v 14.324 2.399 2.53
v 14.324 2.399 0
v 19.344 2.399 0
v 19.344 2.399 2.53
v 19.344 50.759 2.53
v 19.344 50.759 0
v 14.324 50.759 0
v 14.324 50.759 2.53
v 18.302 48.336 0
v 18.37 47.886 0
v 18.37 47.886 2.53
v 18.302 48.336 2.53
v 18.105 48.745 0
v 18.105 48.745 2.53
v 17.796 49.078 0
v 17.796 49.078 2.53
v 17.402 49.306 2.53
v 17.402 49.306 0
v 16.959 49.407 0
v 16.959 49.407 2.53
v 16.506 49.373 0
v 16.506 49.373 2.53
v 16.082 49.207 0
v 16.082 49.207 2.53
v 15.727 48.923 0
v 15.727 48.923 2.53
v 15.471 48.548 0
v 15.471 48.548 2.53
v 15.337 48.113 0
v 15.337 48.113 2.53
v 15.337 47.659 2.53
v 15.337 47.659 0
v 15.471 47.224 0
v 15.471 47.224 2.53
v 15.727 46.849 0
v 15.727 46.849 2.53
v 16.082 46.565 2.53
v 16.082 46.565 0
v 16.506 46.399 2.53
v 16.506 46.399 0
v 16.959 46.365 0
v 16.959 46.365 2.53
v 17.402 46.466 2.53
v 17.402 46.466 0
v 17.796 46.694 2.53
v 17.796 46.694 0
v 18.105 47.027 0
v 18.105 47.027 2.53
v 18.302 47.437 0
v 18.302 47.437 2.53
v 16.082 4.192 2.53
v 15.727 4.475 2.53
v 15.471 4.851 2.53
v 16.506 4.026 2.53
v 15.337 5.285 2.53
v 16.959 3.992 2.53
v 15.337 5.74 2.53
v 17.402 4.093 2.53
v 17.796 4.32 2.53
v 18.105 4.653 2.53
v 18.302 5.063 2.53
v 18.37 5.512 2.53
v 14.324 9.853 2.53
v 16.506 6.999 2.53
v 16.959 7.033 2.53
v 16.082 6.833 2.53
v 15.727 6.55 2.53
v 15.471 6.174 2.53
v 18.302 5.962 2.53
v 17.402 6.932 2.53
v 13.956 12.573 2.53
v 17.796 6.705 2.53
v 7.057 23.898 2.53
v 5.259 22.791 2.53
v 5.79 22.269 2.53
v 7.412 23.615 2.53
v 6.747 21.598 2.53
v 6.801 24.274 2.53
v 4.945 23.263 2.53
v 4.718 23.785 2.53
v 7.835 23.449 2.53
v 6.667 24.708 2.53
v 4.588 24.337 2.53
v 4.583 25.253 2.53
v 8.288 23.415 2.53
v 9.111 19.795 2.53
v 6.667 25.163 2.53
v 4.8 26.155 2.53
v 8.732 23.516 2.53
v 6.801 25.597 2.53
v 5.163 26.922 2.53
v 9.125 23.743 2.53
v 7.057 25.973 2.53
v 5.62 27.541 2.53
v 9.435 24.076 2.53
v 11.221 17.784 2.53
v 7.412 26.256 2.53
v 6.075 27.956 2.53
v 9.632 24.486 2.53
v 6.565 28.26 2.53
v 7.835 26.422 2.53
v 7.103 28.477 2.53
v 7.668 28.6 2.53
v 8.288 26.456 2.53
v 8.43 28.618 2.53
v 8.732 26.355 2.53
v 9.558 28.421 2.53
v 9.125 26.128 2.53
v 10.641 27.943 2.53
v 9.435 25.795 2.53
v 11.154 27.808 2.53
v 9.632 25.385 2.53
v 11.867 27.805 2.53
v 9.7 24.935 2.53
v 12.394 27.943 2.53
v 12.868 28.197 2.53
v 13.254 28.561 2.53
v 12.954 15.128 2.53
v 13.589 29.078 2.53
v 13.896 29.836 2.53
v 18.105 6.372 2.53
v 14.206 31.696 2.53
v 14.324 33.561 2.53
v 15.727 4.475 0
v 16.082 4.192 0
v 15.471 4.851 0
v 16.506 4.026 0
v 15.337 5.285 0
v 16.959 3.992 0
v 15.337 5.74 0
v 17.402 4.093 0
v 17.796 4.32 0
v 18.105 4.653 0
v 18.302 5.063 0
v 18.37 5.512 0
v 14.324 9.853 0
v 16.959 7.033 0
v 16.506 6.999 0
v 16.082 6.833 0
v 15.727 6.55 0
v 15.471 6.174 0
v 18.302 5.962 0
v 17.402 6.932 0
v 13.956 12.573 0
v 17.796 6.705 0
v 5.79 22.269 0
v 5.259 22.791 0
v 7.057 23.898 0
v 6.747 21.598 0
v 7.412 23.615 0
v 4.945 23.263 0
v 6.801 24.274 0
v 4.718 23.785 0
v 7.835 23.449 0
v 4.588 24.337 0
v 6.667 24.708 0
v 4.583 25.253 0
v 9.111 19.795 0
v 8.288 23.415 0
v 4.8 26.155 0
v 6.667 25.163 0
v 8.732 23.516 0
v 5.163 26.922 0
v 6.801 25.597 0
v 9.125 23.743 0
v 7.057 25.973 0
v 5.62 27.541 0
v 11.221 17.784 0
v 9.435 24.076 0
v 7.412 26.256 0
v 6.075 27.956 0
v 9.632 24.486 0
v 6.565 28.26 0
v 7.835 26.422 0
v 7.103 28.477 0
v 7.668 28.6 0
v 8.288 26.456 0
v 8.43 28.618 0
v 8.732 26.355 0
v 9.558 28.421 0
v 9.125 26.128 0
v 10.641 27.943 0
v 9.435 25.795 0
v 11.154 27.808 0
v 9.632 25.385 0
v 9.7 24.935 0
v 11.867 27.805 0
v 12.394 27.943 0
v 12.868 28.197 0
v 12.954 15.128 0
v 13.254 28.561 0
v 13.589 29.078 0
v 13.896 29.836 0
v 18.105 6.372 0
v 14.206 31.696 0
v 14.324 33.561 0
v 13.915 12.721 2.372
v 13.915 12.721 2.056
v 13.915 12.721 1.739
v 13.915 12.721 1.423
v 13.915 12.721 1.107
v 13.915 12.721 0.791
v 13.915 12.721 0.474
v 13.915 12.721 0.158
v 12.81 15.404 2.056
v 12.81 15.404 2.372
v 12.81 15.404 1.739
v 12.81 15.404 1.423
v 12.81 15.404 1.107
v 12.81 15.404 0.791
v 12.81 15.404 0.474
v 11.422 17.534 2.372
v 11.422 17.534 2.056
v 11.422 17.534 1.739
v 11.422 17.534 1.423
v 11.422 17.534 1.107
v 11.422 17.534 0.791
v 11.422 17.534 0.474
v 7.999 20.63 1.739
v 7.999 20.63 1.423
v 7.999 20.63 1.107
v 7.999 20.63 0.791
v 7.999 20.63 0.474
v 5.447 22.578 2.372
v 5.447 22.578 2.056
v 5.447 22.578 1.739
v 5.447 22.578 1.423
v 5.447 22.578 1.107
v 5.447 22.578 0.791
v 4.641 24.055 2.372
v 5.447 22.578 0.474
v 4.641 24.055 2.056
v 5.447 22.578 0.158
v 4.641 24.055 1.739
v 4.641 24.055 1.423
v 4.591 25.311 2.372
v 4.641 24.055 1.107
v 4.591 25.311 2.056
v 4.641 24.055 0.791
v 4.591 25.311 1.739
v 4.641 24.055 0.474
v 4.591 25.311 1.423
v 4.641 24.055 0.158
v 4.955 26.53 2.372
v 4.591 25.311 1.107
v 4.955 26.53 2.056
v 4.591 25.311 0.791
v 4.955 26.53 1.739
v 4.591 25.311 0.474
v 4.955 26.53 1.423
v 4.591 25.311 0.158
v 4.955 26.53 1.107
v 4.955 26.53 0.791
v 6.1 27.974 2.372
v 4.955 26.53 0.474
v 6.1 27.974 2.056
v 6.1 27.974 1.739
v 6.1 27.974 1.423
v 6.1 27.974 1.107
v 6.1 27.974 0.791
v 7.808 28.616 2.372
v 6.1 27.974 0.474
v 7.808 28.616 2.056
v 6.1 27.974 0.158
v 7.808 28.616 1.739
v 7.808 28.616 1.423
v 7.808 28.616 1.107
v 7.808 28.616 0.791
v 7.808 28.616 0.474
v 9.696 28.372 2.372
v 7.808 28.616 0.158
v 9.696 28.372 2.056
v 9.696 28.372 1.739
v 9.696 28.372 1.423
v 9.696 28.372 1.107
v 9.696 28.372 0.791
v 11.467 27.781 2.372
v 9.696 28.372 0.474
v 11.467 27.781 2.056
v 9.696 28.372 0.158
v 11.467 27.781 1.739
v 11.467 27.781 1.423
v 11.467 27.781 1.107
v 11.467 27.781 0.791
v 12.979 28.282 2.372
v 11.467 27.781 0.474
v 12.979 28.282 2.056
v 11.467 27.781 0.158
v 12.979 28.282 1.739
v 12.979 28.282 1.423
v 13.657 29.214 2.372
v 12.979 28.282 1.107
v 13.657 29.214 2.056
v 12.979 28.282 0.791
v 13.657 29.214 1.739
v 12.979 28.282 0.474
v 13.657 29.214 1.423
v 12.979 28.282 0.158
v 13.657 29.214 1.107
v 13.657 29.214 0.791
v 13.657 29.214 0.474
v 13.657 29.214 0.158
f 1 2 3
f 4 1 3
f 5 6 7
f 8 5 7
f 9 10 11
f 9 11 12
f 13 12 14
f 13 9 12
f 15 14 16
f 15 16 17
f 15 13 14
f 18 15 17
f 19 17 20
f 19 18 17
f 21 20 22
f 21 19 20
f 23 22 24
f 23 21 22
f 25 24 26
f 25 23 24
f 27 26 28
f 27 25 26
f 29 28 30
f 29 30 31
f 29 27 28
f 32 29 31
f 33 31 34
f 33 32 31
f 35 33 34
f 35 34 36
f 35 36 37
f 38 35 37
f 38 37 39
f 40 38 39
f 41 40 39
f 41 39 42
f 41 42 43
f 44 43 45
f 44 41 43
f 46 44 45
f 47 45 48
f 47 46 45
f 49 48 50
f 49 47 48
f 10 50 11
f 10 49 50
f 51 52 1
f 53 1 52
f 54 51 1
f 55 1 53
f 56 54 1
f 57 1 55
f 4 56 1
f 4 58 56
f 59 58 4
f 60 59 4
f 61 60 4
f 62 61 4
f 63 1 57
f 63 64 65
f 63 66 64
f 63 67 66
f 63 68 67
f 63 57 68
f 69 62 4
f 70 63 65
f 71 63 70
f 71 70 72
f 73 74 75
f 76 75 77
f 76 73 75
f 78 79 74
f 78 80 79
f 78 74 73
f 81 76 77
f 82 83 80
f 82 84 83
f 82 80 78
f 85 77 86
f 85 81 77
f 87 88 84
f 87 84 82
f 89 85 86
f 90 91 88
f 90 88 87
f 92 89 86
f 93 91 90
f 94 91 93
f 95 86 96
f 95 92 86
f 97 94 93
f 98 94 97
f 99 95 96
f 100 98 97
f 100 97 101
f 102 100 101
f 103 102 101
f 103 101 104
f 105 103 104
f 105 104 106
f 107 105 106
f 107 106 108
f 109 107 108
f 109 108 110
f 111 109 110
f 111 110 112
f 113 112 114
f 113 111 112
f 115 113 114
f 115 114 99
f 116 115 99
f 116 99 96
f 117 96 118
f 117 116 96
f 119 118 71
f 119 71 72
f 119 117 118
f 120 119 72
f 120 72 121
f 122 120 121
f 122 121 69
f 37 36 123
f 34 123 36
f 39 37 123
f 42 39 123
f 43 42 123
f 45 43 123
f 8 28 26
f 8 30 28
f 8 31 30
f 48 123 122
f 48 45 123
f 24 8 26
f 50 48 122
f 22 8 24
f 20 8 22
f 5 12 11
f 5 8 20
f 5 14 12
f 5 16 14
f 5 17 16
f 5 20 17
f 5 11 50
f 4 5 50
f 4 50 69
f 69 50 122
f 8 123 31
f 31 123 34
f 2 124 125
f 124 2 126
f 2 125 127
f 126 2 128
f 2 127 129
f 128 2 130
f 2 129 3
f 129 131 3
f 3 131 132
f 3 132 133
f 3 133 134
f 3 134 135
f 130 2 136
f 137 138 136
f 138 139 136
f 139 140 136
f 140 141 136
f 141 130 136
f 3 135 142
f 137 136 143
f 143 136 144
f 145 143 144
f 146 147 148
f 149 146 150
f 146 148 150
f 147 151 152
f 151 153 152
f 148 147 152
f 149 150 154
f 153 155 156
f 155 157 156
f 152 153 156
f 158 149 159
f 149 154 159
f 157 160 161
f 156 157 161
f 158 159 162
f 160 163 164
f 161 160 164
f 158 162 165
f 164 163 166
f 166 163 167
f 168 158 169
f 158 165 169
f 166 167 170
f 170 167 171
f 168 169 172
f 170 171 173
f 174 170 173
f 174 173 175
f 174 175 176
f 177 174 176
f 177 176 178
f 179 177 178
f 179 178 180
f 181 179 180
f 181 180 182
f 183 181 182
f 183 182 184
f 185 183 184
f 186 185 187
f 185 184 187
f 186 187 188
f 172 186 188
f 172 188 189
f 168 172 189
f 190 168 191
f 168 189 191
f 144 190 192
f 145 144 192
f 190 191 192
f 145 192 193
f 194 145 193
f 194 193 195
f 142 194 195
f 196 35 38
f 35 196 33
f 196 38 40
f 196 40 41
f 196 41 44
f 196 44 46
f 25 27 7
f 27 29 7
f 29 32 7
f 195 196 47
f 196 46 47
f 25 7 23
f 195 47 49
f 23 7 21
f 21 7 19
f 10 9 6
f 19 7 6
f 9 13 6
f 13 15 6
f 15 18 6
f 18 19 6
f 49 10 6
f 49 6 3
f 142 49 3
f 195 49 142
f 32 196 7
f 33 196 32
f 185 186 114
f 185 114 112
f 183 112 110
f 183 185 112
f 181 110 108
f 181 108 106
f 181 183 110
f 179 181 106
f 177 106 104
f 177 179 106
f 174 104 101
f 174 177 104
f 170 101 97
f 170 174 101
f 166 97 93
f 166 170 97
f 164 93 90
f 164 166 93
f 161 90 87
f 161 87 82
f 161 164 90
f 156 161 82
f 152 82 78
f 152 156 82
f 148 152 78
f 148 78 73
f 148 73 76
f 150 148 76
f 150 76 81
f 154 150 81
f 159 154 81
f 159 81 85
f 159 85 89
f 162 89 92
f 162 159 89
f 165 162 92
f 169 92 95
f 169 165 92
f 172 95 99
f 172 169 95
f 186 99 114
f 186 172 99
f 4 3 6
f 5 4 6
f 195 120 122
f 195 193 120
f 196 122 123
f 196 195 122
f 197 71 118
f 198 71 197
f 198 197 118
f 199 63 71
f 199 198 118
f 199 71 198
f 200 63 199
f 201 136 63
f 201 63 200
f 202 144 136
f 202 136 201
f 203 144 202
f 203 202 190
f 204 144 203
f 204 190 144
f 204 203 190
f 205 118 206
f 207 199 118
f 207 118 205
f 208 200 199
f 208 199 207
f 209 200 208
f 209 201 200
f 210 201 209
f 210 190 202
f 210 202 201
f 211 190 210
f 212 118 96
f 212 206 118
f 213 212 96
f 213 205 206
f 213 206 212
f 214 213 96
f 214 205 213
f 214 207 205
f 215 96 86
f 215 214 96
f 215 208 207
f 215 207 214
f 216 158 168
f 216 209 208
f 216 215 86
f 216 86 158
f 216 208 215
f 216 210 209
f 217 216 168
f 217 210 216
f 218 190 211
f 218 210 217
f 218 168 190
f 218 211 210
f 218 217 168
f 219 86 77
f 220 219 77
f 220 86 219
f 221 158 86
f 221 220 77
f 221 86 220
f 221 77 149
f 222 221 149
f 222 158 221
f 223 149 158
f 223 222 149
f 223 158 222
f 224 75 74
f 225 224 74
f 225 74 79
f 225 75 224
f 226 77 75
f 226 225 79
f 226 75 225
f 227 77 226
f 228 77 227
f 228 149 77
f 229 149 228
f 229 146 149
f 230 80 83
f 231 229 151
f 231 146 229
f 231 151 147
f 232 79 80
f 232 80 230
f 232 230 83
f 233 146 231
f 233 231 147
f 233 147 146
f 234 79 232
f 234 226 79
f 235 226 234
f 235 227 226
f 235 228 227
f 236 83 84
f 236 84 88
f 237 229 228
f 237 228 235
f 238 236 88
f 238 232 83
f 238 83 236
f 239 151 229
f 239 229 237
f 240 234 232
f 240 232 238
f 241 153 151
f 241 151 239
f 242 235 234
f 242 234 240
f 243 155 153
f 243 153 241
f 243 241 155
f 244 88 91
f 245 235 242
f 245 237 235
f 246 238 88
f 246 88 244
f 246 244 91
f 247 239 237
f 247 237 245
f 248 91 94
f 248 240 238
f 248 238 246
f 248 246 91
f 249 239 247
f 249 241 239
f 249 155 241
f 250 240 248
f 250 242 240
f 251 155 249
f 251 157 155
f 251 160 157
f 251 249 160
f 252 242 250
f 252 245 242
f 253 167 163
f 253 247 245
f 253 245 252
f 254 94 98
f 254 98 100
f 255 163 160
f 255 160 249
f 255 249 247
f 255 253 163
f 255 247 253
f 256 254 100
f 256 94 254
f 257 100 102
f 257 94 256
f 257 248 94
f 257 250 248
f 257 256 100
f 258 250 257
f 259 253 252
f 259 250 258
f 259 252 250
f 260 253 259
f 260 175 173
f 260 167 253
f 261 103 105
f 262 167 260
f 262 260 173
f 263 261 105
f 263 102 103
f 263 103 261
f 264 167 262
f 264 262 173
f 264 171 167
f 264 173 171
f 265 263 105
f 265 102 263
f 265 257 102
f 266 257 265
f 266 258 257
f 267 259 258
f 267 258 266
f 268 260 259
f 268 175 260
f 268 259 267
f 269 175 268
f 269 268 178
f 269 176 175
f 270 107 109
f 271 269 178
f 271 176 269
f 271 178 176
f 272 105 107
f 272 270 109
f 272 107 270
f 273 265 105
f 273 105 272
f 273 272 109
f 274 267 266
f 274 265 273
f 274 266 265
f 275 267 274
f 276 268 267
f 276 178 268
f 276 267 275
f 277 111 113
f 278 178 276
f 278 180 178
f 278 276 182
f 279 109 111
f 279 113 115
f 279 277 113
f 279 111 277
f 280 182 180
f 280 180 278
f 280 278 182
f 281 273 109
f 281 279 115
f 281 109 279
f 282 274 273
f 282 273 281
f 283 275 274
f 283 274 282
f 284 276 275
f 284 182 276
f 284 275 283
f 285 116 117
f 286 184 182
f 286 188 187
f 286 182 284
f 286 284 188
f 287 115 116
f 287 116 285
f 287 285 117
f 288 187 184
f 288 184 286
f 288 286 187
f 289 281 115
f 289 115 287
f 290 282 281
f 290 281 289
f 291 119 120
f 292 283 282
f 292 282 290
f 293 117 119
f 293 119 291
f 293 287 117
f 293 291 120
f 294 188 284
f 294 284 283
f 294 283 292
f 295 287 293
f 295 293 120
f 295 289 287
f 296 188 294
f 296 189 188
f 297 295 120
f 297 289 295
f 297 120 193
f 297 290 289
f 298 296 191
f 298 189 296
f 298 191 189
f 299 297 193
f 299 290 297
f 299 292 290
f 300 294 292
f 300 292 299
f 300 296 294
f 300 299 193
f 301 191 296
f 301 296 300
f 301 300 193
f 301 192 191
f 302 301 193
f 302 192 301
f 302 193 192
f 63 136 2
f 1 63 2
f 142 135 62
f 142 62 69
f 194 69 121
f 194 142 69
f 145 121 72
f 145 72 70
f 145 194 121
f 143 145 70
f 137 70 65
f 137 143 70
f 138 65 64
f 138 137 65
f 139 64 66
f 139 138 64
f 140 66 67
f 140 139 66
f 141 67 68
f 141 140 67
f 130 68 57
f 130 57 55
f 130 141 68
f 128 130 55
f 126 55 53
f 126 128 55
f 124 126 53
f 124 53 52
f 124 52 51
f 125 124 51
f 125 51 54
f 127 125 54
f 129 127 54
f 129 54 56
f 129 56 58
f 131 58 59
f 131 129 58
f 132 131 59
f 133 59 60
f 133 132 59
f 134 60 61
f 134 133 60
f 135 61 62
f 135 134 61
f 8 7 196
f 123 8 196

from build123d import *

# Parameters (mm, degrees)
SCHIZZO1_R                   = 1.525
ESTRUSIONE_ESTRUSIONE1_DEPTH = 2.53
FORO1_OUTLINE_R              = 1.525
FORO1_DEPTH                  = 2.53


# Read off the part's stored shape, not the designer's step: Foro1
with BuildPart() as part:
    # Schizzo1 → Estrusione-Estrusione1 (new body)
    with BuildSketch(Plane.XY):
        with BuildLine():
            Line((19.344160128, 2.398549361), (19.344160128, 50.758549361))
            Line((19.344160128, 50.758549361), (14.324160128, 50.758549361))
            Line((14.324160128, 50.758549361), (14.324160128, 33.561123443))
            add(Edge.make_bspline(
                [(14.324160128, 9.852536517), (14.329457987, 11.817161621), (13.211895499, 15.314671374), (10.522743691, 18.848719159), (8.133261932, 20.487633555), (6.784543218, 21.63222677), (5.343788341, 22.455699212), (4.348158318, 24.27709897), (4.704770463, 26.412742482), (5.979669362, 28.110436622), (7.489962297, 28.669291236), (8.735881946, 28.611365395), (9.72355423, 28.43270848), (10.565087326, 27.911809633), (11.714510715, 27.680317465), (12.976776108, 28.065540238), (14.318236653, 30.146680578), (14.188406963, 32.145084812), (14.324160128, 33.561123443)],
                knots=[0, 0, 0, 0, 0.165877522, 0.310250801, 0.370355979, 0.413778476, 0.462189974, 0.510332351, 0.581700784, 0.634410755, 0.686591696, 0.711498907, 0.741308267, 0.771463135, 0.795069043, 0.840627944, 0.873607157, 1, 1, 1, 1], degree=3))
            Line((14.324160128, 9.852536517), (14.324160128, 2.398549361))
            Line((14.324160128, 2.398549361), (19.344160128, 2.398549361))
        make_face()
        with Locations((16.844857247, 5.512496703)):
            Circle(SCHIZZO1_R, mode=Mode.SUBTRACT)
        with Locations((8.174532934, 24.935486701)):
            Circle(SCHIZZO1_R, mode=Mode.SUBTRACT)
    extrude(amount=ESTRUSIONE_ESTRUSIONE1_DEPTH)

    # Foro1 outline → Foro1 (cut)
    with BuildSketch(Plane.XY):
        with Locations((16.844857247, 47.886069837)):
            Circle(FORO1_OUTLINE_R)
    extrude(amount=FORO1_DEPTH, mode=Mode.SUBTRACT)


solid = part.part
